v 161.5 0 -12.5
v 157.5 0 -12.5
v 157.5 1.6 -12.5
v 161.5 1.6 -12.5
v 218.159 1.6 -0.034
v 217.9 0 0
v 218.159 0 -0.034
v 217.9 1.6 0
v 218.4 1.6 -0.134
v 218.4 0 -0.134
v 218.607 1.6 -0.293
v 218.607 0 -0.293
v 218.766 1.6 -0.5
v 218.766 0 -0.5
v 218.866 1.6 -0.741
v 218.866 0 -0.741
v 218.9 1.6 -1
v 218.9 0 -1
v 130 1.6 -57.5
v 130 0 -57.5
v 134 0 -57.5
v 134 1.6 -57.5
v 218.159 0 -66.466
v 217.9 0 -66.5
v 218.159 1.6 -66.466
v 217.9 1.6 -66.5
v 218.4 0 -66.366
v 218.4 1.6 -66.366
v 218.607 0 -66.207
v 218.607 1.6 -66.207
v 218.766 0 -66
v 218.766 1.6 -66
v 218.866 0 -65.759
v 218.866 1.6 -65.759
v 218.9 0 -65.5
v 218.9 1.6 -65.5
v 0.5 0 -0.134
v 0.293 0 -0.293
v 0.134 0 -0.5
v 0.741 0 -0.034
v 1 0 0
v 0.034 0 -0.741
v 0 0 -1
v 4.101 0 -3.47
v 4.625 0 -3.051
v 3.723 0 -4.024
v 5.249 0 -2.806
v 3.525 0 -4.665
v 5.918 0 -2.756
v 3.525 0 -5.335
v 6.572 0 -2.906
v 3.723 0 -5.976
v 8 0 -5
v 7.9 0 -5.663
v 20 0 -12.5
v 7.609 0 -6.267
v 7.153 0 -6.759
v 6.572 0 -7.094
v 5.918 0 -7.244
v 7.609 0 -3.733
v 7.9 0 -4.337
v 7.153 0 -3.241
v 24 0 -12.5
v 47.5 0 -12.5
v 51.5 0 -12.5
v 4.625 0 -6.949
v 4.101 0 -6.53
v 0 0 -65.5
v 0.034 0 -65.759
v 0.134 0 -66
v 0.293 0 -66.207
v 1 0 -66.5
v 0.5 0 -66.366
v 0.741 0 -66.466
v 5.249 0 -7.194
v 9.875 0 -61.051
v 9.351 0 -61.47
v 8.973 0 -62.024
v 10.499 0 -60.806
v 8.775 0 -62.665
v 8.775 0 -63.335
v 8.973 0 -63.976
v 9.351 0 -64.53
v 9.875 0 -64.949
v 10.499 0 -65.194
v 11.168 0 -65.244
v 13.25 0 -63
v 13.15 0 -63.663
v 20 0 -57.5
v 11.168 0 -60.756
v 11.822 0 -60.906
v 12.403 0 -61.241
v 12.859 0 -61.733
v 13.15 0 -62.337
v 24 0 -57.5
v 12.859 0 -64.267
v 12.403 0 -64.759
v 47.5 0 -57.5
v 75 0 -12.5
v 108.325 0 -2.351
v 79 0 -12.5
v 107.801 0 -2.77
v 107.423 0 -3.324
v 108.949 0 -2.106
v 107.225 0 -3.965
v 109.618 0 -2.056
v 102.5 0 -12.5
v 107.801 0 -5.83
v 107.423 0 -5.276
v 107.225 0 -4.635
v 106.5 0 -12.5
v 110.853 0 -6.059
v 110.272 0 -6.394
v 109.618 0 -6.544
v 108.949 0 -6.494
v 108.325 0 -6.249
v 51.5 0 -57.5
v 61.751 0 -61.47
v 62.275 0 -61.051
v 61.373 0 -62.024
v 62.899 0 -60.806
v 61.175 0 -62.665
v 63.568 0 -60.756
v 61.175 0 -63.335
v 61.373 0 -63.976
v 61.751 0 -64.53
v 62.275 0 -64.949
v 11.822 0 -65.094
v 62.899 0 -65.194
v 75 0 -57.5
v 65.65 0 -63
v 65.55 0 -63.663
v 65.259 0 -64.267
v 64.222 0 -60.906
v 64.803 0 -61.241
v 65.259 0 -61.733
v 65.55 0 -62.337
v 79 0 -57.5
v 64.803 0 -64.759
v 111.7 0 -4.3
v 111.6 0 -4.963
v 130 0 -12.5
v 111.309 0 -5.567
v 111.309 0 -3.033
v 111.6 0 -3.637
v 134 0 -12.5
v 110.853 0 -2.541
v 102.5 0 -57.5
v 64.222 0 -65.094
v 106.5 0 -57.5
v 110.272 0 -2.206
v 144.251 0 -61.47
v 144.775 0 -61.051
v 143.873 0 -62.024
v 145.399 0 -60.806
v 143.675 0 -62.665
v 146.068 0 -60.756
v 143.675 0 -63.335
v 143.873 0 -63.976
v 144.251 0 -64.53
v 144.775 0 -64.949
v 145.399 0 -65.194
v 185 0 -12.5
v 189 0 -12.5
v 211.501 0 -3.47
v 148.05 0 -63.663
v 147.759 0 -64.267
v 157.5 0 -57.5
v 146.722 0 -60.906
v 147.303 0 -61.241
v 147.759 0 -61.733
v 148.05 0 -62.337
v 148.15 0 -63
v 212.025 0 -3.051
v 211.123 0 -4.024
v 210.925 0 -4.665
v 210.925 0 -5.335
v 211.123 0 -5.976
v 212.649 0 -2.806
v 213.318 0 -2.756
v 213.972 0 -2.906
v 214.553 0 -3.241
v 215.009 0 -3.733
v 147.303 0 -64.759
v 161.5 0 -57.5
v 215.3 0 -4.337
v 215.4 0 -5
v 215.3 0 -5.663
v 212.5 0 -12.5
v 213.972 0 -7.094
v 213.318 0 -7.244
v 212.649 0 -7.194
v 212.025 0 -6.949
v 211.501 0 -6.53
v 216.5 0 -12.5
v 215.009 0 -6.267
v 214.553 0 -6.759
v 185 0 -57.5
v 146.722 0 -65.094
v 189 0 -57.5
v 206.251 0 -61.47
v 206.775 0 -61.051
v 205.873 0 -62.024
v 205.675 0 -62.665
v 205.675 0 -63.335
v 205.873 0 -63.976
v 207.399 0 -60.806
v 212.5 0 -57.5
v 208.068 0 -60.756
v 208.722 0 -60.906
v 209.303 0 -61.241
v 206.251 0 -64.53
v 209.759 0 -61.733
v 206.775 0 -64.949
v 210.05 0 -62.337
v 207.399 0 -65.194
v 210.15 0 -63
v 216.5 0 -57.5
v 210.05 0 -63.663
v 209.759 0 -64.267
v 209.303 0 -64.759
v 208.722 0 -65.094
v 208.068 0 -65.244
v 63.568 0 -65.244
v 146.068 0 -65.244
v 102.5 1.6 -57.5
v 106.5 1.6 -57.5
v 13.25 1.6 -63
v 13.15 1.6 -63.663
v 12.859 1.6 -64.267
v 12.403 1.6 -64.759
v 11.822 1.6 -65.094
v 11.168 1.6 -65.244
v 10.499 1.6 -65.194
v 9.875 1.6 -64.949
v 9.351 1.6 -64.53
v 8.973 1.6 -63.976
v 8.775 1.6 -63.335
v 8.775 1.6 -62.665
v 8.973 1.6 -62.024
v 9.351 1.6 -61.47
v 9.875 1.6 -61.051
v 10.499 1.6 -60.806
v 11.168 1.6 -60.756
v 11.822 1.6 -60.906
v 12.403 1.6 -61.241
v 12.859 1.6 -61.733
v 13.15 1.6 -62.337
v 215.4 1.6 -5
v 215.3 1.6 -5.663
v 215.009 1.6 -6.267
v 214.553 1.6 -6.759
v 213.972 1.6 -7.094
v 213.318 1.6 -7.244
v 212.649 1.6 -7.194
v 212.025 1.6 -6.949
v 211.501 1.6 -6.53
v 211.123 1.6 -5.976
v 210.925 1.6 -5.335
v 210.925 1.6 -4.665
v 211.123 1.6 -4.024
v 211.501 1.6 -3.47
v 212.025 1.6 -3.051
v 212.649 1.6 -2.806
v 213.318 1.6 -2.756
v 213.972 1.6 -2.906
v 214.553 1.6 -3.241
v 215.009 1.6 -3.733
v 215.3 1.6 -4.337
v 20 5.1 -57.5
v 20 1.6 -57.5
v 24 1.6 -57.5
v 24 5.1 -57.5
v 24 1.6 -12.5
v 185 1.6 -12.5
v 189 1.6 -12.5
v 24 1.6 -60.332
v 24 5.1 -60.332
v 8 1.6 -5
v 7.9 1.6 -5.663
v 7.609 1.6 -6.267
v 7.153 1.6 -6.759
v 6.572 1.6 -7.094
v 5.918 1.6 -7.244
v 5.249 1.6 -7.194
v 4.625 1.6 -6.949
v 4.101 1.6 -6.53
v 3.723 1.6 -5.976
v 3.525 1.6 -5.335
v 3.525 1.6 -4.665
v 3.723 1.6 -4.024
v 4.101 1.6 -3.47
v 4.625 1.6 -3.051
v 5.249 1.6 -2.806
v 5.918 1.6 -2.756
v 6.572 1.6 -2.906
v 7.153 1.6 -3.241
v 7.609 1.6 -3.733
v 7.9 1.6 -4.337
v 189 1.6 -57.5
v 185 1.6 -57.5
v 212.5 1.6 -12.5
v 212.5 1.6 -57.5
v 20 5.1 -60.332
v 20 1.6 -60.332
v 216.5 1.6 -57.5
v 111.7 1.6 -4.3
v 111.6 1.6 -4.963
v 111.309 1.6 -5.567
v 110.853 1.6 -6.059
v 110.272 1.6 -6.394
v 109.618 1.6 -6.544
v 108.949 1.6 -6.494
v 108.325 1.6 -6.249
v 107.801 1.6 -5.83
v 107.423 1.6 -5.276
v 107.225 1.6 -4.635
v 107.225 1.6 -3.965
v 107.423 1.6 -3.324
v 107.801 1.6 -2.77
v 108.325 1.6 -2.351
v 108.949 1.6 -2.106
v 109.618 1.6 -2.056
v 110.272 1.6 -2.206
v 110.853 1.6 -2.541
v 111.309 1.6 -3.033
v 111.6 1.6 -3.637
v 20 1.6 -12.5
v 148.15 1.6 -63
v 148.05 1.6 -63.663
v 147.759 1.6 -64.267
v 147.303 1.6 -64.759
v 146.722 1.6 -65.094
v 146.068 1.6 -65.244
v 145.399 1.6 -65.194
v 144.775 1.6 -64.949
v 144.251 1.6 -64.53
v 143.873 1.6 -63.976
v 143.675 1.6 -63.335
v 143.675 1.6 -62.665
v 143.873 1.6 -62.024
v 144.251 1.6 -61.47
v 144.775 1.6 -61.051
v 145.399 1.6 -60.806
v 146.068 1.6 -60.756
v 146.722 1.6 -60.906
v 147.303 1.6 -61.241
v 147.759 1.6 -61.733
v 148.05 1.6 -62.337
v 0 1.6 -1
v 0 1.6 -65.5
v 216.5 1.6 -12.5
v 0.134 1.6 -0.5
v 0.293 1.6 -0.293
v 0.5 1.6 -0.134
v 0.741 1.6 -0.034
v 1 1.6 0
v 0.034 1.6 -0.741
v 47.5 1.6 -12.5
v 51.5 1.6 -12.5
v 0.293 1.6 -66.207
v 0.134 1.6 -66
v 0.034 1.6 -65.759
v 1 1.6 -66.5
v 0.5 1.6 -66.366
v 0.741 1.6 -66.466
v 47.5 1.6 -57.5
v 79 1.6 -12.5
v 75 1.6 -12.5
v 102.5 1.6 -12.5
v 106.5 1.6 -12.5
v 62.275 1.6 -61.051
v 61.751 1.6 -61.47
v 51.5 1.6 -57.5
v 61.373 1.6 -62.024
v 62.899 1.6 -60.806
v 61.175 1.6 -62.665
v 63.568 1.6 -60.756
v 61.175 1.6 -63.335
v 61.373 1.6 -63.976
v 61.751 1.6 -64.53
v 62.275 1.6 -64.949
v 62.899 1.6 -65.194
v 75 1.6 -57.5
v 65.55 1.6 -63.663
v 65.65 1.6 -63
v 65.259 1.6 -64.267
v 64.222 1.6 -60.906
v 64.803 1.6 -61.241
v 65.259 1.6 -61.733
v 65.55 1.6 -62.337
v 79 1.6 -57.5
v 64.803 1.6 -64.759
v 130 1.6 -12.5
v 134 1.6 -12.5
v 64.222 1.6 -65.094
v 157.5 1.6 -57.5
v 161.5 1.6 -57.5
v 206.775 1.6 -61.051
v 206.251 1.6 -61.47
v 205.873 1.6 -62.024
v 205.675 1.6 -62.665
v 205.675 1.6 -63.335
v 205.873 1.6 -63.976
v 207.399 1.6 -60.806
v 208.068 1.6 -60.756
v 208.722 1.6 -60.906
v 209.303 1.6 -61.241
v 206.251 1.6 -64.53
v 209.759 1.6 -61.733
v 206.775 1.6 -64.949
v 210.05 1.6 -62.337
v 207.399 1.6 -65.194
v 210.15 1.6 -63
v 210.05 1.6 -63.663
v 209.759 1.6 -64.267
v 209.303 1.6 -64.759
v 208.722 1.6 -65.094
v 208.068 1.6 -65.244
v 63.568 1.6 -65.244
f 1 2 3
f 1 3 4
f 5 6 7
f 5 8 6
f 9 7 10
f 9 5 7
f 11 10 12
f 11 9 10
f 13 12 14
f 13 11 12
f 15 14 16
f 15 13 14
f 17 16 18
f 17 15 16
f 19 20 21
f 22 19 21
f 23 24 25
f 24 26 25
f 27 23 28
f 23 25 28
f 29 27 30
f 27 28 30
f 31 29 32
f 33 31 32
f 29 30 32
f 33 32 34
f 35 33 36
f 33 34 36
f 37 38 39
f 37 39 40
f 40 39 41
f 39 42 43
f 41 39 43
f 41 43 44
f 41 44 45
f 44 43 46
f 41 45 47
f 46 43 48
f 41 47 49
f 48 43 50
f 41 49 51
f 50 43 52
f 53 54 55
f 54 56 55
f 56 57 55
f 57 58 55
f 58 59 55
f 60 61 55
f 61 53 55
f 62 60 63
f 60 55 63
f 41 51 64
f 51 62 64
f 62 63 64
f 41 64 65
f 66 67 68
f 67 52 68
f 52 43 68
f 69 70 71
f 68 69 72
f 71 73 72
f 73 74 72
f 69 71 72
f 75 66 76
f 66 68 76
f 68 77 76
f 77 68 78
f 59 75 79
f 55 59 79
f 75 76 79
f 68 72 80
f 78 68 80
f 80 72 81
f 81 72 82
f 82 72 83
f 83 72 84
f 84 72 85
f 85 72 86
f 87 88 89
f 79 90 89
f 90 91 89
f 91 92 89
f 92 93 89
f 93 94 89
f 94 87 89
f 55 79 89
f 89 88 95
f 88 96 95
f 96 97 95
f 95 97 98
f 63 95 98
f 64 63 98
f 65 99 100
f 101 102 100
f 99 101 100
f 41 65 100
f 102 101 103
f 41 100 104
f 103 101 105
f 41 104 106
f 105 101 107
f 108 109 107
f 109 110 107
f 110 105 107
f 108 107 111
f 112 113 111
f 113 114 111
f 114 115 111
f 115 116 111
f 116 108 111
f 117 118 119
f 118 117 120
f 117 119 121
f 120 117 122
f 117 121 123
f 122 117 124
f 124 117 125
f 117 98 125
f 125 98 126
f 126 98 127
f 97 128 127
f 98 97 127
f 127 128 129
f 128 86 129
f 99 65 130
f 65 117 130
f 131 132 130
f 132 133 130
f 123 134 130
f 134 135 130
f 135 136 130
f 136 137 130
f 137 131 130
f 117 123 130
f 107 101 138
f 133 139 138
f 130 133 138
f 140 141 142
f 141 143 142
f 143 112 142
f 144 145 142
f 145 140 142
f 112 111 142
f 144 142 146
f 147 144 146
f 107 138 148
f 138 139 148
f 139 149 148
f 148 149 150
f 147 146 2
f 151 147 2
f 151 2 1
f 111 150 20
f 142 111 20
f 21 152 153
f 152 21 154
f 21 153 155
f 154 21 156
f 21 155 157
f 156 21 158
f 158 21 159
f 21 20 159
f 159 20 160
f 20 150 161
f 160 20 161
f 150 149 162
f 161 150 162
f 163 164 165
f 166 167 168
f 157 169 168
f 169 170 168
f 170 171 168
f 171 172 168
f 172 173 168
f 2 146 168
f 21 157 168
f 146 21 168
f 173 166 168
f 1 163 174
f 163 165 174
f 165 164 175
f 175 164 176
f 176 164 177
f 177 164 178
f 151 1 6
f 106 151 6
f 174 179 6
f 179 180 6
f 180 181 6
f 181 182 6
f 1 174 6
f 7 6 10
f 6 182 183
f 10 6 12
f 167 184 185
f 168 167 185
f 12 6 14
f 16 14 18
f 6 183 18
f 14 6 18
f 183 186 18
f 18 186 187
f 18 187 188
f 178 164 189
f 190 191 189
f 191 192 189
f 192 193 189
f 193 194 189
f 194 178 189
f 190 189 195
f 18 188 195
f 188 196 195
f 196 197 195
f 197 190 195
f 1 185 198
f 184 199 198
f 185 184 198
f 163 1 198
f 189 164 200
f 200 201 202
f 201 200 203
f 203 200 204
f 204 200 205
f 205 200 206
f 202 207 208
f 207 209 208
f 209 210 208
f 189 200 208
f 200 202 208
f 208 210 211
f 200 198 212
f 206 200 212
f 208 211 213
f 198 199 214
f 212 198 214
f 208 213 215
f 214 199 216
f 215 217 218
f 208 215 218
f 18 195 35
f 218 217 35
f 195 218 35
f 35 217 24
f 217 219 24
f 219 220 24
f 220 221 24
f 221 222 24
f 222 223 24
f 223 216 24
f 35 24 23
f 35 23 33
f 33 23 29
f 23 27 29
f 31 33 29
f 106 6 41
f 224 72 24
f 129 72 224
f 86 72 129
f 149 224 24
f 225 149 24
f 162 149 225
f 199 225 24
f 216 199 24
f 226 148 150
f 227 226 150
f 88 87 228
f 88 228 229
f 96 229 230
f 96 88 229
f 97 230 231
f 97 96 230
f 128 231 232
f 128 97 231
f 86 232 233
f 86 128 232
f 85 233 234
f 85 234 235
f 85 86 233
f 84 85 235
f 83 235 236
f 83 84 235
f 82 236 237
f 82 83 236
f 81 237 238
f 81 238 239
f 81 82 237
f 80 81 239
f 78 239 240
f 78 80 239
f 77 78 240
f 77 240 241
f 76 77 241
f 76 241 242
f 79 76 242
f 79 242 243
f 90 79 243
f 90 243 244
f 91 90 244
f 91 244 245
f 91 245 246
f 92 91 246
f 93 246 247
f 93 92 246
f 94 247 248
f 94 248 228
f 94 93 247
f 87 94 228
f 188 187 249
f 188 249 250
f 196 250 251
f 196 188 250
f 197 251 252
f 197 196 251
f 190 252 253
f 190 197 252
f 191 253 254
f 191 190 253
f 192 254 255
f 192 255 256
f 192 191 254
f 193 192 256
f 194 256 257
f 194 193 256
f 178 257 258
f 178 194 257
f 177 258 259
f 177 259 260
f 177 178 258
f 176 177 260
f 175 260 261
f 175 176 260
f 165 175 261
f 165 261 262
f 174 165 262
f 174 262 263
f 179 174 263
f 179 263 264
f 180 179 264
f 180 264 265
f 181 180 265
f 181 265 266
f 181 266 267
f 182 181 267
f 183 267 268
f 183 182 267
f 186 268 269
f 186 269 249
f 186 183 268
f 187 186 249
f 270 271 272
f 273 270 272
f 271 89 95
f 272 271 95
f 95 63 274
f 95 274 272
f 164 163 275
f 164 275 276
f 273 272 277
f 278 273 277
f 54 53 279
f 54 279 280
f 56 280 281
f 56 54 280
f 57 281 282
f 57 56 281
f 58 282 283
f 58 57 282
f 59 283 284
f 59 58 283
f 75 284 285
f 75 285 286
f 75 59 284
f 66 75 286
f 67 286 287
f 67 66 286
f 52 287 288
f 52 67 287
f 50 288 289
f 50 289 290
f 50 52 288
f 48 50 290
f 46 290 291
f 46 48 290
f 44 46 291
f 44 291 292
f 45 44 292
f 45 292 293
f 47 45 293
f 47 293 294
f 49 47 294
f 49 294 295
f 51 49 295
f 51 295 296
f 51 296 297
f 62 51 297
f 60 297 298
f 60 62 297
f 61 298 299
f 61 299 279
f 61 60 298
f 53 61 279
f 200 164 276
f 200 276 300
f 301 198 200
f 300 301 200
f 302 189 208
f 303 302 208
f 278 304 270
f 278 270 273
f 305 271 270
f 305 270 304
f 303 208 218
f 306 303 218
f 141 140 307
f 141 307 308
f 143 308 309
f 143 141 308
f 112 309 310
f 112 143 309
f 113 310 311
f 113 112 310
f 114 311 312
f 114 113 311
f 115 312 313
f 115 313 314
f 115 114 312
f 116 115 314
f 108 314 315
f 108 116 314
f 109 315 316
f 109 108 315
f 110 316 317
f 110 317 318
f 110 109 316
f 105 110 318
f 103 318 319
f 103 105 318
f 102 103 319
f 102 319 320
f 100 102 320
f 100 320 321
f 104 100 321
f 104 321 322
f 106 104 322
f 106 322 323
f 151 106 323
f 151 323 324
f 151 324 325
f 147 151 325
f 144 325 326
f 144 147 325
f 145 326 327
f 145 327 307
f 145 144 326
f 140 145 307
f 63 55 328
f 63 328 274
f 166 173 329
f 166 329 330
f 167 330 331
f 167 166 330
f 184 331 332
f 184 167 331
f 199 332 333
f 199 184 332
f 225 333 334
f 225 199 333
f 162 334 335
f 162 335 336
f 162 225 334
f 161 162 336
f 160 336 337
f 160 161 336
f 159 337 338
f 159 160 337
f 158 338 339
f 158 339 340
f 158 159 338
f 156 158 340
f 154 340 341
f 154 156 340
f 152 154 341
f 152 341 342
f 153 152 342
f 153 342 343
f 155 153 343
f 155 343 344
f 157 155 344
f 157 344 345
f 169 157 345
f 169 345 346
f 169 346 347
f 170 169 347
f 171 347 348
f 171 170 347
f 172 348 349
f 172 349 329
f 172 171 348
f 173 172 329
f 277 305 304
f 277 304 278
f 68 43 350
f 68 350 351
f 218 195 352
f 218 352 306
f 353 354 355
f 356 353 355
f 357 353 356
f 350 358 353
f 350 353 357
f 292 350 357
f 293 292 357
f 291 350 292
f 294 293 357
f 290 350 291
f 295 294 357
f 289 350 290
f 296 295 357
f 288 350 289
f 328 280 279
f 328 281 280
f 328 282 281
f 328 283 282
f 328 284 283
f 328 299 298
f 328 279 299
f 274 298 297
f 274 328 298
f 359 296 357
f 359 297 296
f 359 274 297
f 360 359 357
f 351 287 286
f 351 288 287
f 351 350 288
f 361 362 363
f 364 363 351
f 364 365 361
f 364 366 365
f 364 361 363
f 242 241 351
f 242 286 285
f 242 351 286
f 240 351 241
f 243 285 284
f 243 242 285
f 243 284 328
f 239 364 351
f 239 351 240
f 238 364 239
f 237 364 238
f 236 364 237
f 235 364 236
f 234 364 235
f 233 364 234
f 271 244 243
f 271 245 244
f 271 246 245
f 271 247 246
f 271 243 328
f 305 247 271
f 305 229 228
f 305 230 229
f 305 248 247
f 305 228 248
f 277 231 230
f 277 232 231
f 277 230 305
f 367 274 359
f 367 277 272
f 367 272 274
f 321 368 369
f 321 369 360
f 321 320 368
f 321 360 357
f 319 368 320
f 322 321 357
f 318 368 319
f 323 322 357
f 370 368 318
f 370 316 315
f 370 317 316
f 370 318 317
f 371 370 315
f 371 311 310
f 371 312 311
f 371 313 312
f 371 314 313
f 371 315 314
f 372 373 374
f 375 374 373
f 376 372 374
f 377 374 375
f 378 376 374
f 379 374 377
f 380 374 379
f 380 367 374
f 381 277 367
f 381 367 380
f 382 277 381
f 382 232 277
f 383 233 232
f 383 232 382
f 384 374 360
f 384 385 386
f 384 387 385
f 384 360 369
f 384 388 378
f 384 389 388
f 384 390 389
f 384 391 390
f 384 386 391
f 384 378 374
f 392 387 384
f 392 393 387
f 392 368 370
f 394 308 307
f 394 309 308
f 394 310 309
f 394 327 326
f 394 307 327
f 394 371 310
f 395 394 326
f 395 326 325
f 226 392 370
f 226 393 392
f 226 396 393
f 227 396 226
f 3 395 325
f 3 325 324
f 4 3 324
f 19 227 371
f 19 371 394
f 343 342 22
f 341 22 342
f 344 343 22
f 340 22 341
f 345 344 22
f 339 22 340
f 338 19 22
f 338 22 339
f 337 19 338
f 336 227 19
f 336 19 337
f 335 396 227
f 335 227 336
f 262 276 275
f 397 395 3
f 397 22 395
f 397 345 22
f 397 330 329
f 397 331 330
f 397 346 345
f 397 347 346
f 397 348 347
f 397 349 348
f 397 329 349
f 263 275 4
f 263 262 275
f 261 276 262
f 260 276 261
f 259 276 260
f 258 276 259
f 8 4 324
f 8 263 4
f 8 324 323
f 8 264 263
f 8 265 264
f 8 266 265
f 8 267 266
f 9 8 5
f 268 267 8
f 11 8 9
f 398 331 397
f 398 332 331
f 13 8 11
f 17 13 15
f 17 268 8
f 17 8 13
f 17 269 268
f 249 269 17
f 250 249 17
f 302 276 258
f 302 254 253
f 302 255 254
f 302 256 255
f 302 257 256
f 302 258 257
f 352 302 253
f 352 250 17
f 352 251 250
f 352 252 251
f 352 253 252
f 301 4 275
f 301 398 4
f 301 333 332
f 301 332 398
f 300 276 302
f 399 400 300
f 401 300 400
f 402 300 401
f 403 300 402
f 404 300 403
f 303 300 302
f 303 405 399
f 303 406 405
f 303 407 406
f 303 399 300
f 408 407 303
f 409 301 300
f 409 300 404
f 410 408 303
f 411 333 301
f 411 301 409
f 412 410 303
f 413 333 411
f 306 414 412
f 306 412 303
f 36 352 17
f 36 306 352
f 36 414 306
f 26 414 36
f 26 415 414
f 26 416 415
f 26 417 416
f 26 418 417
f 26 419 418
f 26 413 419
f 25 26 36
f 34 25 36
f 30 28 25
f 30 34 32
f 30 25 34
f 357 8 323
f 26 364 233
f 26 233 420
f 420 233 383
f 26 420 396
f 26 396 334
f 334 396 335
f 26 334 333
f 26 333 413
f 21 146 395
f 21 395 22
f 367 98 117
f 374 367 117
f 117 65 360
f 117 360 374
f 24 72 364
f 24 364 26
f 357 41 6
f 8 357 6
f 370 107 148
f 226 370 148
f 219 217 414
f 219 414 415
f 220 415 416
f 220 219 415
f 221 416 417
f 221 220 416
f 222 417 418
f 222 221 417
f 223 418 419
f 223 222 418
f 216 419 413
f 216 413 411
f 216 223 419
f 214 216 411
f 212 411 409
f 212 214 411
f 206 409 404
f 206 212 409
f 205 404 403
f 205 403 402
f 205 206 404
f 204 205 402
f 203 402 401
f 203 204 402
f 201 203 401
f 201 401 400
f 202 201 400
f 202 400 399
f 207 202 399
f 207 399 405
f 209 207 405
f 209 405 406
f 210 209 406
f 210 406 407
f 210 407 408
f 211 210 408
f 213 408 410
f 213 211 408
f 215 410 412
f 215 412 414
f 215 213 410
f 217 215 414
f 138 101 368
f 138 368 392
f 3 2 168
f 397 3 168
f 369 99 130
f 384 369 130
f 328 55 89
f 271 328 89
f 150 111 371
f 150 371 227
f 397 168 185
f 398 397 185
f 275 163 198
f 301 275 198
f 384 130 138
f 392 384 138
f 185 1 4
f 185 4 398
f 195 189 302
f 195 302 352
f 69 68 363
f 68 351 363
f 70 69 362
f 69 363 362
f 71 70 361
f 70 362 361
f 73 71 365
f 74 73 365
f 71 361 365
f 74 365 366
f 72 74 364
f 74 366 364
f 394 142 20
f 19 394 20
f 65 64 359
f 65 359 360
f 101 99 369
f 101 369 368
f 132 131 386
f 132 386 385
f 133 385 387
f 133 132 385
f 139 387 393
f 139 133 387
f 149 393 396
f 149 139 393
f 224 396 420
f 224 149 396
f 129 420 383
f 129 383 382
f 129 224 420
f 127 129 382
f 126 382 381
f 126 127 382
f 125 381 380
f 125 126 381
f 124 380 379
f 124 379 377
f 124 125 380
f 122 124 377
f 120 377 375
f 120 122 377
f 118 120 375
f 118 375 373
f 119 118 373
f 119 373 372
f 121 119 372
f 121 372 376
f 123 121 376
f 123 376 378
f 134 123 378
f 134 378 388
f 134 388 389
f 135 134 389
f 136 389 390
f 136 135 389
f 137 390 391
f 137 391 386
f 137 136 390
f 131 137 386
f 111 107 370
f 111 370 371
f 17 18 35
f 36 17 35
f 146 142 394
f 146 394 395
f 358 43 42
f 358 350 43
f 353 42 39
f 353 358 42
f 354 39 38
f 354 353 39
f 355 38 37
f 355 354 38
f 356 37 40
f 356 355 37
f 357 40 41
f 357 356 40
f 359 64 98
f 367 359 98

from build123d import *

# Parameters (mm, degrees)
SKETCH1_W           = 218.9
SKETCH1_H           = 66.5
SKETCH1_R           = 2.25
SKETCH1_W_2         = 4
SKETCH1_H_2         = 45
BOSS_EXTRUDE1_DEPTH = 1.6
FILLET1_R           = 1
SKETCH3_W           = 4
SKETCH3_H           = 2.831639971
BOSS_EXTRUDE2_DEPTH = 5.1


with BuildPart() as part:
    # Sketch1 → Boss-Extrude1 (new body)
    with BuildSketch(Plane(origin=(0, 0, 0), x_dir=(1, 0, 0), z_dir=(0, 1, 0))):
        with Locations((109.45, 33.25)):
            Rectangle(SKETCH1_W, SKETCH1_H)
        with Locations((11, 63)):
            Circle(SKETCH1_R, mode=Mode.SUBTRACT)
        with Locations((63.4, 63)):
            Circle(SKETCH1_R, mode=Mode.SUBTRACT)
        with Locations((145.9, 63)):
            Circle(SKETCH1_R, mode=Mode.SUBTRACT)
        with Locations((207.9, 63)):
            Circle(SKETCH1_R, mode=Mode.SUBTRACT)
        with Locations((5.75, 5)):
            Circle(SKETCH1_R, mode=Mode.SUBTRACT)
        with Locations((109.45, 4.3)):
            Circle(SKETCH1_R, mode=Mode.SUBTRACT)
        with Locations((213.15, 5)):
            Circle(SKETCH1_R, mode=Mode.SUBTRACT)
        with Locations((22, 35)):
            Rectangle(SKETCH1_W_2, SKETCH1_H_2, mode=Mode.SUBTRACT)
        with Locations((49.5, 35)):
            Rectangle(SKETCH1_W_2, SKETCH1_H_2, mode=Mode.SUBTRACT)
        with Locations((77, 35)):
            Rectangle(SKETCH1_W_2, SKETCH1_H_2, mode=Mode.SUBTRACT)
        with Locations((104.5, 35)):
            Rectangle(SKETCH1_W_2, SKETCH1_H_2, mode=Mode.SUBTRACT)
        with Locations((132, 35)):
            Rectangle(SKETCH1_W_2, SKETCH1_H_2, mode=Mode.SUBTRACT)
        with Locations((159.5, 35)):
            Rectangle(SKETCH1_W_2, SKETCH1_H_2, mode=Mode.SUBTRACT)
        with Locations((187, 35)):
            Rectangle(SKETCH1_W_2, SKETCH1_H_2, mode=Mode.SUBTRACT)
        with Locations((214.5, 35)):
            Rectangle(SKETCH1_W_2, SKETCH1_H_2, mode=Mode.SUBTRACT)
    extrude(amount=BOSS_EXTRUDE1_DEPTH)

    # Fillet1
    fillet1_edges = [part.edges().sort_by_distance(p)[0] for p in [
        (0, 0.8, -66.5),
        (218.9, 0.8, -66.5),
        (218.9, 0.8, 0),
        (0, 0.8, 0),
    ]]
    fillet(fillet1_edges, radius=FILLET1_R)

    # Sketch3 → Boss-Extrude2 (add)
    with BuildSketch(Plane(origin=(0, 0, 0), x_dir=(1, 0, 0), z_dir=(0, 1, 0))):
        with Locations((22, 58.915819986)):
            Rectangle(SKETCH3_W, SKETCH3_H)
    extrude(amount=BOSS_EXTRUDE2_DEPTH)


solid = part.part
